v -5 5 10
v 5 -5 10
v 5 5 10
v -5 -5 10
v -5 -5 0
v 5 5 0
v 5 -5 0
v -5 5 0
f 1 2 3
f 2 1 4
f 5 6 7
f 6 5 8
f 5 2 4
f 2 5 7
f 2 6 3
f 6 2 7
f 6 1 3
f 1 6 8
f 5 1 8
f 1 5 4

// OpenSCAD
translate([0, 0, 5]) color([0,1,0,0.9]) cube([10, 10, 10], center=true);
